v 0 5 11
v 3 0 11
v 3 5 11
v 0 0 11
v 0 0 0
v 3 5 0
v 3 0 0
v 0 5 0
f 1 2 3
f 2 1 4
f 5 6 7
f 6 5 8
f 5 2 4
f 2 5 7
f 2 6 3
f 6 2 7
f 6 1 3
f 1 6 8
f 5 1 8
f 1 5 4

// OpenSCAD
// Generated by SolidPython 1.0.1 on 2020-07-29 00:46:54


cube(size = [3, 5, 11]);
/***********************************************
*********      SolidPython code:      **********
************************************************
 
# import packages: SolidPython
from solid import *
from solid.utils import *
from itertools import chain, combinations, permutations


class Resize:

    def __init__(self, scad_file):
        self.scad_file = scad_file
        #self.scad_file = import_scad(scad_file)
        # cone/cylinder param:
        self.r1 = 0
        self.r2 = 0
        self.h = 0
        # rectangular prism param:
        self.w = 0
        self.l = 0
        # ellipse param:
        self.r = 0

    # import OpenScad code (file name corresponds to shape)


    # classify shape + parameters
    def assign(self, param1, param2, param3):
        if self.scad_file == 'cone.scad':
            self.r1 = param1
            self.r2 = param2
            self.h = param3
        elif self.scad_file == 'cylinder.scad':
            self.r1 = param1
            self.r2 = param2
            self.h = param3
        elif self.scad_file == 'rectangularPrism.scad':
            self.h = param1
            self.l = param2
            self.w = param3
        else:
            self.r = param1
            self.h = param2

    # resize parameters
    def iterate(self):
        x = range(3, 20, 2)
        i = 1
        if self.scad_file == 'cone.scad':
            tempList = list(permutations(x, 2))
            for temp in tempList:
                param1 = temp[0]
                param2 = temp[1]
                filepath = 'produced_scad_files/' + 'cone' + str(param1) + '_' + str(param2) + '_' + '.scad'
                scad_render_to_file(cylinder(h=param1, r1=param2, r2=0), filepath)

        elif self.scad_file == 'cylinder.scad':
            tempList = list(permutations(x, 3))
            for temp in tempList:
                param1 = temp[0]
                param2 = temp[1]
                filepath = 'produced_scad_files/' + 'cylinder' + str(param1) + '_' + str(param2) + '_' + '.scad'
                scad_render_to_file(cylinder(h=param1, r1=param2, r2=param2), filepath)

        elif self.scad_file == 'rectangularPrism.scad':
            tempList = list(permutations(x, 3))
            for temp in tempList:
                param1 = temp[0]
                param2 = temp[1]
                param3 = temp[2]
                filepath = 'produced_scad_files/' + 'rectangularPrism' + str(param1) + '_' + str(param2) + '_' + str(
                    param3) + '.scad'
                scad_render_to_file(cube(size=(param1, param2, param3)), filepath)

        elif self.scad_file == 'ellipse.scad':
            tempList = list(permutations(x, 4))
            for temp in tempList:
                param1 = temp[0]
                param2 = temp[1]
                param3 = temp[2]
                param4 = temp[3]
                filepath = 'produced_scad_files/' + 'ellipse' + str(param1) + '_' + str(param2) + '_' + str(param3) + '_' + str(param4) + '.scad'
                scad_render_to_file(scale([param1, param2, param3])(sphere(r=param4)), filepath)

    def render_to_scadfile(self):
        scad_render_to_file(scad, 'example.scad') 
 
************************************************/
